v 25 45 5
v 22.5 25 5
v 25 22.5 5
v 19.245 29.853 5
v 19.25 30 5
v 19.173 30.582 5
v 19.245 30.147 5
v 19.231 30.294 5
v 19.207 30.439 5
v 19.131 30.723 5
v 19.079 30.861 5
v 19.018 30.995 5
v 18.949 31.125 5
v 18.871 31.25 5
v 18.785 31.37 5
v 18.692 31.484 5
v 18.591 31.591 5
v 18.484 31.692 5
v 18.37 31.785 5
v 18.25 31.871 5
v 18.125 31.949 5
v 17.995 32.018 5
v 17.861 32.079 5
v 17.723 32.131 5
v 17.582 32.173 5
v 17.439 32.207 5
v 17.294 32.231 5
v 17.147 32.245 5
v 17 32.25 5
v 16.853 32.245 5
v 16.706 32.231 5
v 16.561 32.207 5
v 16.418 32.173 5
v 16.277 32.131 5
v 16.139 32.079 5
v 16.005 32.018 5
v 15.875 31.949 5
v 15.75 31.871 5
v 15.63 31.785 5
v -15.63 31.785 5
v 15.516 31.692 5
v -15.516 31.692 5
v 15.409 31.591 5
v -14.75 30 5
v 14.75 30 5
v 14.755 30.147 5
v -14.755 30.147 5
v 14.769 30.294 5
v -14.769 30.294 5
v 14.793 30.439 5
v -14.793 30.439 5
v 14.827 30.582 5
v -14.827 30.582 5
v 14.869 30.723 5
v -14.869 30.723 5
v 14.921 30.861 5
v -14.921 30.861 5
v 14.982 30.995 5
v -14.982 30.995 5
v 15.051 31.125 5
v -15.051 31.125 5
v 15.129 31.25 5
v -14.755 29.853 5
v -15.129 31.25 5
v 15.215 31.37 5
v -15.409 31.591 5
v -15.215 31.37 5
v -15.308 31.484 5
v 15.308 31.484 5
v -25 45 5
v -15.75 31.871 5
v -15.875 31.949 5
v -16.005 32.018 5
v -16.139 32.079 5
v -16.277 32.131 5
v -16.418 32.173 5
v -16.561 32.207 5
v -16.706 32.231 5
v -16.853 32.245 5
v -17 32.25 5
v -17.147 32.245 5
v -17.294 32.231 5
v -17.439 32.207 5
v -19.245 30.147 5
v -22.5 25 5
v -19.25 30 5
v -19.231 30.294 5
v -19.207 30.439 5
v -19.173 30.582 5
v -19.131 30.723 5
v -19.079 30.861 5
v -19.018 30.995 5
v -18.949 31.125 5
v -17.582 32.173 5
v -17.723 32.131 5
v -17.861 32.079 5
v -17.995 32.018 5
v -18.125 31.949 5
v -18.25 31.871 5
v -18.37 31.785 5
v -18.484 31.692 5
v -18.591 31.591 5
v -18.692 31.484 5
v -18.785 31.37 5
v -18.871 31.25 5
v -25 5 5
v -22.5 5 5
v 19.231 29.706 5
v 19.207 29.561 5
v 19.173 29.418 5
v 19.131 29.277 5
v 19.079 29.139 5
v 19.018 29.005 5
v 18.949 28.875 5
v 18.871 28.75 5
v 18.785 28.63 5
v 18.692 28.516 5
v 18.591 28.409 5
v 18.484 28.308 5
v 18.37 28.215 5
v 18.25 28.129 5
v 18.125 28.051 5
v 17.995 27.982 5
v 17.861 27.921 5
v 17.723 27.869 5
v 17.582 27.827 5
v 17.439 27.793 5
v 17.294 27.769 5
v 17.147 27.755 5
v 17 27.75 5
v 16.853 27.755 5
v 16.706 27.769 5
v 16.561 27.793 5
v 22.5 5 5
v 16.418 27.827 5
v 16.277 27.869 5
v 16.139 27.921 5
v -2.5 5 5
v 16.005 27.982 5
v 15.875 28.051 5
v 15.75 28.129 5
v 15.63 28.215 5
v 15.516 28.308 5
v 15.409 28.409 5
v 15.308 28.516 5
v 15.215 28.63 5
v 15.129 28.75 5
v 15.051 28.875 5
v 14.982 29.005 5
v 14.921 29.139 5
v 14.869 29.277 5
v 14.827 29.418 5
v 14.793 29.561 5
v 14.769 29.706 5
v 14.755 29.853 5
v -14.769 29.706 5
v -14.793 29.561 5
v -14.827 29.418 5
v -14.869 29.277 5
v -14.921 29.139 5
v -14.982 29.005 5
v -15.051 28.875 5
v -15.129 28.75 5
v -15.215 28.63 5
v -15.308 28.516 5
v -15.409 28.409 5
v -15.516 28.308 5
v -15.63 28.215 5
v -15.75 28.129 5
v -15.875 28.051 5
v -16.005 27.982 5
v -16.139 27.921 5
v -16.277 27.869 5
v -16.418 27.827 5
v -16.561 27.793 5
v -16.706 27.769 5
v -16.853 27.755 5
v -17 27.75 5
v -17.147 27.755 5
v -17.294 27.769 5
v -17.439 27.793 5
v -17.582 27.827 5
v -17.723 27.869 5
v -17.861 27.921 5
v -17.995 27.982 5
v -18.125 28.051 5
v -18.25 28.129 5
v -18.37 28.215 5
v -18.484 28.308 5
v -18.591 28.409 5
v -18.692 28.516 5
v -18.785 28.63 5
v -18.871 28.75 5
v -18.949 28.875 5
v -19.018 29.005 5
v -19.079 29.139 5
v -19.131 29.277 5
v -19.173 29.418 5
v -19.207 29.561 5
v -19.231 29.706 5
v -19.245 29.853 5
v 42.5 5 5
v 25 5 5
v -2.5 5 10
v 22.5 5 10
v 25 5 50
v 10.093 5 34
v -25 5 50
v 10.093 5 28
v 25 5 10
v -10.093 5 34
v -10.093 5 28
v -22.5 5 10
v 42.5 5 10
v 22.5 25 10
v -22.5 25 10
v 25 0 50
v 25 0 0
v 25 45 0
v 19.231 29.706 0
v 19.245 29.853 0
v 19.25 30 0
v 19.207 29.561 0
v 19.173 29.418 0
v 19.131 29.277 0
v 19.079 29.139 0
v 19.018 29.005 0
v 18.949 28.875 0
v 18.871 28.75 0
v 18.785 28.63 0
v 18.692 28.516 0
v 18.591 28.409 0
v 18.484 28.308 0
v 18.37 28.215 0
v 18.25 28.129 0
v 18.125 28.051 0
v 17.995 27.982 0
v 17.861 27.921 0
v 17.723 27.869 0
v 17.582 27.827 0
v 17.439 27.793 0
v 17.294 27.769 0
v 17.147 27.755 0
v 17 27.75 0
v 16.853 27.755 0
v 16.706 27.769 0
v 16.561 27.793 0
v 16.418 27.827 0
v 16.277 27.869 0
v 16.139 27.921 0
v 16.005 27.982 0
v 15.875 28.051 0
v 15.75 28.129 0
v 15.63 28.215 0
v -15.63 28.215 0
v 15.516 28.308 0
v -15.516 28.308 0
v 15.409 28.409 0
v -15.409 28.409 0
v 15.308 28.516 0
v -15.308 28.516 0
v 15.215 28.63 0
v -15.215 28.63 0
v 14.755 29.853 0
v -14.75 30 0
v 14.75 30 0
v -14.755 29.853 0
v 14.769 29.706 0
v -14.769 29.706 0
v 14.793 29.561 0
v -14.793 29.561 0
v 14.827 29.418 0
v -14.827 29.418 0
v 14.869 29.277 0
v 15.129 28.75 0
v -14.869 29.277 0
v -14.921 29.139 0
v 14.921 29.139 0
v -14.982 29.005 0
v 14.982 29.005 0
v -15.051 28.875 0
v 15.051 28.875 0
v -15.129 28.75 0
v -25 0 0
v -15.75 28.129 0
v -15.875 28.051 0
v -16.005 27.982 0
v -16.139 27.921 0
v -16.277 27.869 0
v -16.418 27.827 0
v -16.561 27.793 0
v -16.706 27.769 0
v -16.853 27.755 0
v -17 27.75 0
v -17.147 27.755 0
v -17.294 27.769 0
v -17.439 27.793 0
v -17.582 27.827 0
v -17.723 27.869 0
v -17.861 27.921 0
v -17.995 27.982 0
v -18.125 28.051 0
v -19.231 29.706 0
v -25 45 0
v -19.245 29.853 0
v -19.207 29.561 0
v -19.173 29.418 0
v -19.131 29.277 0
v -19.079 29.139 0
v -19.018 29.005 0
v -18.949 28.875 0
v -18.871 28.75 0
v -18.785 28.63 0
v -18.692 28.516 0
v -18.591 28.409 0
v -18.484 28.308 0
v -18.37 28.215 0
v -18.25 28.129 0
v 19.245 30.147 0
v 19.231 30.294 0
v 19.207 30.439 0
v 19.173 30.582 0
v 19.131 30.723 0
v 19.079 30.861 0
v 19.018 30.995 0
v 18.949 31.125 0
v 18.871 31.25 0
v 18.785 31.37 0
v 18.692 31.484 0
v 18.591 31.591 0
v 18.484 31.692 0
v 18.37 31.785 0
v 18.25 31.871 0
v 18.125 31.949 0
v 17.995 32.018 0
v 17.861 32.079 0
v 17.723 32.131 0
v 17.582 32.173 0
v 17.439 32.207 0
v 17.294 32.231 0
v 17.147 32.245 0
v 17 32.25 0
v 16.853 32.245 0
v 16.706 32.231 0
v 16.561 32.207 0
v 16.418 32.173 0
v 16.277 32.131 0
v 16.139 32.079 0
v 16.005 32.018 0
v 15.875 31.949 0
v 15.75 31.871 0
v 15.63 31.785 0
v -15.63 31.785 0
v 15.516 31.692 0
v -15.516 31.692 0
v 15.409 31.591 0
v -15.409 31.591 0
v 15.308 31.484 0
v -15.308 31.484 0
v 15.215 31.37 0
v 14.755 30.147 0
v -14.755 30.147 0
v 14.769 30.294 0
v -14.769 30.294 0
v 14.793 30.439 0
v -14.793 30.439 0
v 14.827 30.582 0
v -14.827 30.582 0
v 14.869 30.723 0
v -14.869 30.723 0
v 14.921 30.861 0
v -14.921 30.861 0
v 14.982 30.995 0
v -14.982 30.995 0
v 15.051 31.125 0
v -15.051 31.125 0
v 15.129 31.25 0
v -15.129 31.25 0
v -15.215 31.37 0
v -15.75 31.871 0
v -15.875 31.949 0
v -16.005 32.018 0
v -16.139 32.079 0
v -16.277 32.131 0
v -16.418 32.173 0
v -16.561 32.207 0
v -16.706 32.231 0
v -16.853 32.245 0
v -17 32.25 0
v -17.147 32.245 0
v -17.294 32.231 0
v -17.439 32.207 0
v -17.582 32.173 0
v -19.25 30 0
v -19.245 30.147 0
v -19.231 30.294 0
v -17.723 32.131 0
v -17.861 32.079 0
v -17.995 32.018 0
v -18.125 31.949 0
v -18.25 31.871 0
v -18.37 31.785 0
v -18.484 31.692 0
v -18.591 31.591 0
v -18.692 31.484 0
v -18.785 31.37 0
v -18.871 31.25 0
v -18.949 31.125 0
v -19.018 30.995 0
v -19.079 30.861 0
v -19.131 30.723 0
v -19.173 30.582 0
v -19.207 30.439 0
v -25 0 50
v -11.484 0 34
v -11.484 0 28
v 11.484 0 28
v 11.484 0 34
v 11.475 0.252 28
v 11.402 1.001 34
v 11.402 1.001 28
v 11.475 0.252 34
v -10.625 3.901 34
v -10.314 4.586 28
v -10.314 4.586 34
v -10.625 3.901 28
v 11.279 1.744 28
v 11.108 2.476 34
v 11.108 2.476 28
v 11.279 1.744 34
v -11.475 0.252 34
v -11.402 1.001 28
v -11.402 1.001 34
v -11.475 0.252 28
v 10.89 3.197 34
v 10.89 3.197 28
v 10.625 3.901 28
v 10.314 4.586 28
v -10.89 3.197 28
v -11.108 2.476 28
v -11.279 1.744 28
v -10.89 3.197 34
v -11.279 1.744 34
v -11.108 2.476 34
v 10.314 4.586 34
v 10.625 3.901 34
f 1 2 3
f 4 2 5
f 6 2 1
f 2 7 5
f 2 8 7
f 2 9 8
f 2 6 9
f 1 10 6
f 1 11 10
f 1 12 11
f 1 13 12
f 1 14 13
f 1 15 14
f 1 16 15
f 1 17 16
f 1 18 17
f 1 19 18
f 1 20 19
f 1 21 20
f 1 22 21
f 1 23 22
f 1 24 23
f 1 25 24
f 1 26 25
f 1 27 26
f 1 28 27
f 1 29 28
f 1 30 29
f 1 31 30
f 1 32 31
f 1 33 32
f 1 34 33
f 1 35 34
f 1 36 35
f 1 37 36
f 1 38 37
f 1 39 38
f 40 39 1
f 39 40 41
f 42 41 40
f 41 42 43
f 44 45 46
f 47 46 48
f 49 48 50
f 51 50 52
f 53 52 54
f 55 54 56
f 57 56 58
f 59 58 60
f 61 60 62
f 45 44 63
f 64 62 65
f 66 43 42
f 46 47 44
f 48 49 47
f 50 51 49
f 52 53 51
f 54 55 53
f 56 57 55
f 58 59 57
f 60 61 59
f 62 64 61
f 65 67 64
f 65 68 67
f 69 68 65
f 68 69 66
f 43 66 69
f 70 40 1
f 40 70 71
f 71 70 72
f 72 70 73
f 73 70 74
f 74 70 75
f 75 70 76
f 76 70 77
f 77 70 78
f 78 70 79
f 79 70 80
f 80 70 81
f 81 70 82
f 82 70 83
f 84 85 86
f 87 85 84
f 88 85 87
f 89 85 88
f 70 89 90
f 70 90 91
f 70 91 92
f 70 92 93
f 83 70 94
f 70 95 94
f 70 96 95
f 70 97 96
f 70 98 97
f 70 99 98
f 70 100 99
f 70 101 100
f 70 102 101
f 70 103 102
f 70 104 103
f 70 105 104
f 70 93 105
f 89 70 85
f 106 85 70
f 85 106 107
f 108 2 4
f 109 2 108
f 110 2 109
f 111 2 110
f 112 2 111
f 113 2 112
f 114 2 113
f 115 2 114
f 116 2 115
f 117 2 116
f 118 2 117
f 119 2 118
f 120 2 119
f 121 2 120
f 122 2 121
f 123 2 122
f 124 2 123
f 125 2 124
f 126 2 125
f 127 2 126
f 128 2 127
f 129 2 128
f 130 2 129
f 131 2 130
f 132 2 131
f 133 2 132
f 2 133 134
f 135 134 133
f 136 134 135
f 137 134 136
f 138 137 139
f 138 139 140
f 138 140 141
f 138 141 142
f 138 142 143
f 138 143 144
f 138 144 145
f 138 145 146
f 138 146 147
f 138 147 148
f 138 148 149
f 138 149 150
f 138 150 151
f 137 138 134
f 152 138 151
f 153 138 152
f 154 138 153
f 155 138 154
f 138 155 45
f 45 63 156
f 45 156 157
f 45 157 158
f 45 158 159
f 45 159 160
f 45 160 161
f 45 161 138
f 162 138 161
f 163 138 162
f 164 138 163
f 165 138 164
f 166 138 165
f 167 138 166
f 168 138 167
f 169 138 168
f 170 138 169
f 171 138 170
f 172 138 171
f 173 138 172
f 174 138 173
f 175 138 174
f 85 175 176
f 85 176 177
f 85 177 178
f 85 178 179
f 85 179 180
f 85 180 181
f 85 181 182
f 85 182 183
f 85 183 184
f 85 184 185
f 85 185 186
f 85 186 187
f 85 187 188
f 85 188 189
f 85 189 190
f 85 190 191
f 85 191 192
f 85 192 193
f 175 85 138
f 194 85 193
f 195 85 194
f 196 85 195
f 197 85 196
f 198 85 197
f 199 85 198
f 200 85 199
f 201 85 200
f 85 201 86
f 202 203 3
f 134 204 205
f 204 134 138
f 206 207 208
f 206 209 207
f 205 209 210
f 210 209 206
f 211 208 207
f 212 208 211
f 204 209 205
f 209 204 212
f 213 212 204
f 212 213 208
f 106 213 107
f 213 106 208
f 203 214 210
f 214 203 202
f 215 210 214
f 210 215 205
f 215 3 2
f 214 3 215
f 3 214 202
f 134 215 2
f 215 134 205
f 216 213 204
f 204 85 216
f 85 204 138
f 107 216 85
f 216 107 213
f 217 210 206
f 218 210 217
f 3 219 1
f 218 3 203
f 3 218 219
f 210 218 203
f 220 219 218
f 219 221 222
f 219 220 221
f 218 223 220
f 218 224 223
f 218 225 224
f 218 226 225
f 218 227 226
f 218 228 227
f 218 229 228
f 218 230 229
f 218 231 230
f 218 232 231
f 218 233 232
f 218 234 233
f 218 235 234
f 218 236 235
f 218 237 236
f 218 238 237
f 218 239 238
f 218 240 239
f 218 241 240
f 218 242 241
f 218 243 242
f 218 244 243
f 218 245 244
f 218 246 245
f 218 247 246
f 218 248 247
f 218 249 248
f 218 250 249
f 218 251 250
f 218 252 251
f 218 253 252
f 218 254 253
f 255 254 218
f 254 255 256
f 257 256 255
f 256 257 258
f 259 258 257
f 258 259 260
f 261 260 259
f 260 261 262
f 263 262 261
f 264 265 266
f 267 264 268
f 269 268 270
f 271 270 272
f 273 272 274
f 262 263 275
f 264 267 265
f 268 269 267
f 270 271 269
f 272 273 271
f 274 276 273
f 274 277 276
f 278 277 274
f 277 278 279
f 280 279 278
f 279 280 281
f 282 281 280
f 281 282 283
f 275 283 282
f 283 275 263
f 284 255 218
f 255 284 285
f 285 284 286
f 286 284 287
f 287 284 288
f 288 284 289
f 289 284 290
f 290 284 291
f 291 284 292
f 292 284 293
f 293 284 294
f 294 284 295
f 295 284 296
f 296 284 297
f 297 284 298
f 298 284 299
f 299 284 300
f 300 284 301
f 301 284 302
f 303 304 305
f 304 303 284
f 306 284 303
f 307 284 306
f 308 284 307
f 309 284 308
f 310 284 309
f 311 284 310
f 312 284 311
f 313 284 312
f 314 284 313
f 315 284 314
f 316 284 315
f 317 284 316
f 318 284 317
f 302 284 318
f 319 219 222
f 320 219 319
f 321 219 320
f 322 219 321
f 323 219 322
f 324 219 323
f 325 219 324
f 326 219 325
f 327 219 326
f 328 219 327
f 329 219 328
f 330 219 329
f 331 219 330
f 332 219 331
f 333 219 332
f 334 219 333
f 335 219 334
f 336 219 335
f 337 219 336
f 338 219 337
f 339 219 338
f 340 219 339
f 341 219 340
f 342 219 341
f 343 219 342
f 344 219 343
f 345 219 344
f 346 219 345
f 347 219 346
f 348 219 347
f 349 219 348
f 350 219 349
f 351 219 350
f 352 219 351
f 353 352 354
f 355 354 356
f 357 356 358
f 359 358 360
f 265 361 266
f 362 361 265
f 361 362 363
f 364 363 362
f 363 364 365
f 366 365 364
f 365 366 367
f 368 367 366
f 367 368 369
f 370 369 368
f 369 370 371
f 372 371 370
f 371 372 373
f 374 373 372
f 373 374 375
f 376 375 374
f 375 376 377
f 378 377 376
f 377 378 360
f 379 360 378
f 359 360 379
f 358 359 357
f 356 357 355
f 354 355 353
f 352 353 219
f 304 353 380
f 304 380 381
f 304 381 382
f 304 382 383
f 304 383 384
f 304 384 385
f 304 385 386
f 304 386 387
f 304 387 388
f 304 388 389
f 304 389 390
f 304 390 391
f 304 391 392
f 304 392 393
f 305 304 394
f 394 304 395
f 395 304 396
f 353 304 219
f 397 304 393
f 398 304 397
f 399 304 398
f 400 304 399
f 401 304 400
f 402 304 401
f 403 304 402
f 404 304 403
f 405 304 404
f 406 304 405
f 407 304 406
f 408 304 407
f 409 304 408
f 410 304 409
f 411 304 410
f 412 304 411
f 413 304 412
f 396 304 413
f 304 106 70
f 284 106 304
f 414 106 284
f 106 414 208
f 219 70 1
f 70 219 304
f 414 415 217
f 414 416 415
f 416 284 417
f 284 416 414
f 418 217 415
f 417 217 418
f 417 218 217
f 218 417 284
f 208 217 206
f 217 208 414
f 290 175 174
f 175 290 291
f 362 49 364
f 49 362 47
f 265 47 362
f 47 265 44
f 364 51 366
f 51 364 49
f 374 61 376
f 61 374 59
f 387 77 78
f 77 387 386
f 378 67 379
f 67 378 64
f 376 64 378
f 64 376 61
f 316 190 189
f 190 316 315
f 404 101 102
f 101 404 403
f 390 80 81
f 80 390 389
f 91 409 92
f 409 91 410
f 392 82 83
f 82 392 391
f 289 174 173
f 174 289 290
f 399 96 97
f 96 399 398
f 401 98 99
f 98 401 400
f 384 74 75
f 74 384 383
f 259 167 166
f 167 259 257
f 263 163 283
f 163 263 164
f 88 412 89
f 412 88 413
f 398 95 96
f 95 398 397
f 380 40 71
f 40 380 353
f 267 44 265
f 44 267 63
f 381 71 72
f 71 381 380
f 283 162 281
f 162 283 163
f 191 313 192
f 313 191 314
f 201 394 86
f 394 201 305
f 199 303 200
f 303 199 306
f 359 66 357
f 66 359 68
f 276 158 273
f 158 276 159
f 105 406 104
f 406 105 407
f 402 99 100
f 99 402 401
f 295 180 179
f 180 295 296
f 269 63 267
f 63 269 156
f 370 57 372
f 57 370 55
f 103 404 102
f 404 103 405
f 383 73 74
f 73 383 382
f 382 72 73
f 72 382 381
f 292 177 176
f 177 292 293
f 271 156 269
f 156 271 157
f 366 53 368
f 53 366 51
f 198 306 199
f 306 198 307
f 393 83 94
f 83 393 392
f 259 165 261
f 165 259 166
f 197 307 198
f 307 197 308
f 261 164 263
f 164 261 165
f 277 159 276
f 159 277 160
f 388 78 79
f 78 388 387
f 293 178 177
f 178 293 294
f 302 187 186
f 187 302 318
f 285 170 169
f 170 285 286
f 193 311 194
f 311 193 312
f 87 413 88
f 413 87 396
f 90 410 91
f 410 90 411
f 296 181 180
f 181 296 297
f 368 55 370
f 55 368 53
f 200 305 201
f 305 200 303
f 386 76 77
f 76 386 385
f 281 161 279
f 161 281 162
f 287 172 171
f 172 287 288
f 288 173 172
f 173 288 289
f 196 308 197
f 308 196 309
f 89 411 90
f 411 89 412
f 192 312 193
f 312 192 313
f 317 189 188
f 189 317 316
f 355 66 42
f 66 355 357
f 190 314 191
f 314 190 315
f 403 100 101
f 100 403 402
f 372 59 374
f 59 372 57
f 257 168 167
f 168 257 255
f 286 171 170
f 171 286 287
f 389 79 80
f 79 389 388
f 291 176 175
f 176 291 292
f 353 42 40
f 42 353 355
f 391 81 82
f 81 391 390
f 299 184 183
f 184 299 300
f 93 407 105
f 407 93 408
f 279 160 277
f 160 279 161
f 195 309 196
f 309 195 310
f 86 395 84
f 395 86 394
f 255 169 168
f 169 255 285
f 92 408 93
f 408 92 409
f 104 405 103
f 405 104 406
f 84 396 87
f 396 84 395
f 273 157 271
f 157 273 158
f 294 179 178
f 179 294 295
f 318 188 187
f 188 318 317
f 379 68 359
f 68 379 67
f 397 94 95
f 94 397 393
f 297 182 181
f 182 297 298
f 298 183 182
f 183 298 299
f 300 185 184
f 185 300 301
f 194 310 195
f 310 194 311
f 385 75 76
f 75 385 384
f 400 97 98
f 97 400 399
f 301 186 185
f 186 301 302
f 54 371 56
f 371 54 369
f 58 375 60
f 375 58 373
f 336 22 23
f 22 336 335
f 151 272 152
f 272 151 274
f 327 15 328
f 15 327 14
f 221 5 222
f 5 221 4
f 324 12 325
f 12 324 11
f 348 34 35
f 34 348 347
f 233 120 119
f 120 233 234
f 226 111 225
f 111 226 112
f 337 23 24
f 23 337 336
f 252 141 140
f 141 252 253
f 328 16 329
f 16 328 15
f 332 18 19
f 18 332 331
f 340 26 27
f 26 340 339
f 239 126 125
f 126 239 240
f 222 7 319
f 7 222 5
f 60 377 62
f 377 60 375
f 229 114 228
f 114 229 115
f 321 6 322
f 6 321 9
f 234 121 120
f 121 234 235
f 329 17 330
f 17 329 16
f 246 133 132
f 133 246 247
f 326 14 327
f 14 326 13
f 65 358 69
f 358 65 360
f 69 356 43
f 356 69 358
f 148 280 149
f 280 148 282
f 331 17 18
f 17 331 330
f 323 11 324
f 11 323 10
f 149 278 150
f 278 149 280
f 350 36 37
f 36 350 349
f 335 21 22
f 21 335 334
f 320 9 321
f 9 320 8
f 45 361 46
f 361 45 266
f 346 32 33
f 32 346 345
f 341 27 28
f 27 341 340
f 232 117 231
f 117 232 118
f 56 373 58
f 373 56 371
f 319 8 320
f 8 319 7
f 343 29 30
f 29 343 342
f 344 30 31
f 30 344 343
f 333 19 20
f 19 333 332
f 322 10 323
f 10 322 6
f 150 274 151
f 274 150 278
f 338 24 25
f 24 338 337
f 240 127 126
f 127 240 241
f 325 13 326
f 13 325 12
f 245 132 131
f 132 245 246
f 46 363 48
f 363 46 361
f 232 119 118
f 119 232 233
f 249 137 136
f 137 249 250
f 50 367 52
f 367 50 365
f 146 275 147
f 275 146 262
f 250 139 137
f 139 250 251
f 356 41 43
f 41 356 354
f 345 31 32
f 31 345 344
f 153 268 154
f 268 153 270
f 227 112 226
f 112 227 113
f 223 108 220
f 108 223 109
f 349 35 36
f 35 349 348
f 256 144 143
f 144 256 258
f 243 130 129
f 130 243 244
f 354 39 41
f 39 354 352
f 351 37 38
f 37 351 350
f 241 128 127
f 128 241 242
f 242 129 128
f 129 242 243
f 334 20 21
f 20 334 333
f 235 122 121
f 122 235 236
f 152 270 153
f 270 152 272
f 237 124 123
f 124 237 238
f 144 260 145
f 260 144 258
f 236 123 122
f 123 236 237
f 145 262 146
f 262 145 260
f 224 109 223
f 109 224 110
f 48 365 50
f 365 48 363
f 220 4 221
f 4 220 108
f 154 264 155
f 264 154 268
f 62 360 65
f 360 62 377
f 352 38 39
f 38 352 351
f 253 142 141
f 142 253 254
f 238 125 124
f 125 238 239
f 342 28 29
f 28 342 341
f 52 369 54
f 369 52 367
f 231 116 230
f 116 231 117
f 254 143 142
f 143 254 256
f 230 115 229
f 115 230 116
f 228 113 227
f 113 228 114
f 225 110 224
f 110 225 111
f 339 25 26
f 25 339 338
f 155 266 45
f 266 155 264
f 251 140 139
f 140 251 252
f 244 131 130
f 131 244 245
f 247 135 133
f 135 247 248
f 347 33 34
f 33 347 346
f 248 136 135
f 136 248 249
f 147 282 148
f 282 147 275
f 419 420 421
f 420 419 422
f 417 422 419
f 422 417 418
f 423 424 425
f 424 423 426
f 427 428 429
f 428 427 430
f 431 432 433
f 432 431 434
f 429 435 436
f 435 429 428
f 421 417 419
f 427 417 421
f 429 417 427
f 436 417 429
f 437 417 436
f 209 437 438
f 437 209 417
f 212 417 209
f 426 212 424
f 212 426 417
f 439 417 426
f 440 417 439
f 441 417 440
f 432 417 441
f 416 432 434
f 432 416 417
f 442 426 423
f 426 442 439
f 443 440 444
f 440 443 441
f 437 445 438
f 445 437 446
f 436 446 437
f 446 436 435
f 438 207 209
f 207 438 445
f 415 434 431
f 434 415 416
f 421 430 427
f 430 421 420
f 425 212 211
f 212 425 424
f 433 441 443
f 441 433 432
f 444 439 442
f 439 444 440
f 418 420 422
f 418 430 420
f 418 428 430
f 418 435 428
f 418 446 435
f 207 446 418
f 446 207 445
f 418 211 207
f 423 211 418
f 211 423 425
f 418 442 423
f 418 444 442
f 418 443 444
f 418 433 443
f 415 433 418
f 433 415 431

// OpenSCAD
// L-shaped mounting bracket for NEMA 17 stepper motor (e.g. syringe pump)
// Print orientation: base plate on bed, motor plate builds upward (+Z)

// ---------------- Parameters ----------------
base_x      = 25;    // base plate half-length in X (plate spans -25 to 25)
base_y      = 45;    // base plate length in Y (0 to 45)
base_z      = 5;     // base plate thickness

motor_x     = 25;    // motor plate half-length in X (plate spans -25 to 25)
motor_y     = 5;     // motor plate thickness in Y (0 to 5)
motor_z     = 50;    // motor plate height in Z (0 to 50)

boss_d      = 23;    // motor centring boss hole diameter
boss_x      = 0;     // boss hole centre X
boss_z      = 28;    // boss hole centre Z

screw_d     = 3.4;   // M3 screw hole diameter
screw_n     = 4;     // number of screw holes
screw_p     = 31;    // square pattern side length (centred on boss hole)

gusset_t    = 5;     // gusset thickness in X
gusset_x0   = -25;   // left gusset start X
gusset_x1   = -20;   // left gusset end X
gusset_y    = 20;    // gusset leg along +Y (from y = 5)
gusset_z    = 20;    // gusset leg along +Z (from z = 5)

eps         = 0.5;   // cutter overshoot past faces
$fn         = 96;    // curve resolution

// ---------------- Model ----------------
difference() {
    union() {
        // Base plate
        translate([-base_x, 0, 0])
            cube([2 * base_x, base_y, base_z]);

        // Vertical motor plate
        translate([-motor_x, 0, 0])
            cube([2 * motor_x, motor_y, motor_z]);

        // Gussets (right-angle corner at y = 5, z = 5)
        for (sx = [-1, 1])
            translate([sx * (gusset_x0 + gusset_t / 2), 5, 5])
                linear_extrude(height = gusset_t)
                    polygon([[0, 0], [gusset_y, 0], [0, gusset_z]]);
    }

    // Base plate M4 through-holes
    translate([-17, 30, -eps])
        cylinder(d = 4.5, h = base_z + 2 * eps);
    translate([17, 30, -eps])
        cylinder(d = 4.5, h = base_z + 2 * eps);

    // Motor plate boss hole (along Y) and M3 screw holes
    translate([boss_x, -eps, boss_z])
        cylinder(d = boss_d, h = motor_y + 2 * eps);
    for (i = [0 : screw_n - 1]) {
        a = screw_p * (i - (screw_n - 1) / 2);
        translate([0, a, boss_z])
            cylinder(d = screw_d, h = motor_y + 2 * eps);
    }
}
